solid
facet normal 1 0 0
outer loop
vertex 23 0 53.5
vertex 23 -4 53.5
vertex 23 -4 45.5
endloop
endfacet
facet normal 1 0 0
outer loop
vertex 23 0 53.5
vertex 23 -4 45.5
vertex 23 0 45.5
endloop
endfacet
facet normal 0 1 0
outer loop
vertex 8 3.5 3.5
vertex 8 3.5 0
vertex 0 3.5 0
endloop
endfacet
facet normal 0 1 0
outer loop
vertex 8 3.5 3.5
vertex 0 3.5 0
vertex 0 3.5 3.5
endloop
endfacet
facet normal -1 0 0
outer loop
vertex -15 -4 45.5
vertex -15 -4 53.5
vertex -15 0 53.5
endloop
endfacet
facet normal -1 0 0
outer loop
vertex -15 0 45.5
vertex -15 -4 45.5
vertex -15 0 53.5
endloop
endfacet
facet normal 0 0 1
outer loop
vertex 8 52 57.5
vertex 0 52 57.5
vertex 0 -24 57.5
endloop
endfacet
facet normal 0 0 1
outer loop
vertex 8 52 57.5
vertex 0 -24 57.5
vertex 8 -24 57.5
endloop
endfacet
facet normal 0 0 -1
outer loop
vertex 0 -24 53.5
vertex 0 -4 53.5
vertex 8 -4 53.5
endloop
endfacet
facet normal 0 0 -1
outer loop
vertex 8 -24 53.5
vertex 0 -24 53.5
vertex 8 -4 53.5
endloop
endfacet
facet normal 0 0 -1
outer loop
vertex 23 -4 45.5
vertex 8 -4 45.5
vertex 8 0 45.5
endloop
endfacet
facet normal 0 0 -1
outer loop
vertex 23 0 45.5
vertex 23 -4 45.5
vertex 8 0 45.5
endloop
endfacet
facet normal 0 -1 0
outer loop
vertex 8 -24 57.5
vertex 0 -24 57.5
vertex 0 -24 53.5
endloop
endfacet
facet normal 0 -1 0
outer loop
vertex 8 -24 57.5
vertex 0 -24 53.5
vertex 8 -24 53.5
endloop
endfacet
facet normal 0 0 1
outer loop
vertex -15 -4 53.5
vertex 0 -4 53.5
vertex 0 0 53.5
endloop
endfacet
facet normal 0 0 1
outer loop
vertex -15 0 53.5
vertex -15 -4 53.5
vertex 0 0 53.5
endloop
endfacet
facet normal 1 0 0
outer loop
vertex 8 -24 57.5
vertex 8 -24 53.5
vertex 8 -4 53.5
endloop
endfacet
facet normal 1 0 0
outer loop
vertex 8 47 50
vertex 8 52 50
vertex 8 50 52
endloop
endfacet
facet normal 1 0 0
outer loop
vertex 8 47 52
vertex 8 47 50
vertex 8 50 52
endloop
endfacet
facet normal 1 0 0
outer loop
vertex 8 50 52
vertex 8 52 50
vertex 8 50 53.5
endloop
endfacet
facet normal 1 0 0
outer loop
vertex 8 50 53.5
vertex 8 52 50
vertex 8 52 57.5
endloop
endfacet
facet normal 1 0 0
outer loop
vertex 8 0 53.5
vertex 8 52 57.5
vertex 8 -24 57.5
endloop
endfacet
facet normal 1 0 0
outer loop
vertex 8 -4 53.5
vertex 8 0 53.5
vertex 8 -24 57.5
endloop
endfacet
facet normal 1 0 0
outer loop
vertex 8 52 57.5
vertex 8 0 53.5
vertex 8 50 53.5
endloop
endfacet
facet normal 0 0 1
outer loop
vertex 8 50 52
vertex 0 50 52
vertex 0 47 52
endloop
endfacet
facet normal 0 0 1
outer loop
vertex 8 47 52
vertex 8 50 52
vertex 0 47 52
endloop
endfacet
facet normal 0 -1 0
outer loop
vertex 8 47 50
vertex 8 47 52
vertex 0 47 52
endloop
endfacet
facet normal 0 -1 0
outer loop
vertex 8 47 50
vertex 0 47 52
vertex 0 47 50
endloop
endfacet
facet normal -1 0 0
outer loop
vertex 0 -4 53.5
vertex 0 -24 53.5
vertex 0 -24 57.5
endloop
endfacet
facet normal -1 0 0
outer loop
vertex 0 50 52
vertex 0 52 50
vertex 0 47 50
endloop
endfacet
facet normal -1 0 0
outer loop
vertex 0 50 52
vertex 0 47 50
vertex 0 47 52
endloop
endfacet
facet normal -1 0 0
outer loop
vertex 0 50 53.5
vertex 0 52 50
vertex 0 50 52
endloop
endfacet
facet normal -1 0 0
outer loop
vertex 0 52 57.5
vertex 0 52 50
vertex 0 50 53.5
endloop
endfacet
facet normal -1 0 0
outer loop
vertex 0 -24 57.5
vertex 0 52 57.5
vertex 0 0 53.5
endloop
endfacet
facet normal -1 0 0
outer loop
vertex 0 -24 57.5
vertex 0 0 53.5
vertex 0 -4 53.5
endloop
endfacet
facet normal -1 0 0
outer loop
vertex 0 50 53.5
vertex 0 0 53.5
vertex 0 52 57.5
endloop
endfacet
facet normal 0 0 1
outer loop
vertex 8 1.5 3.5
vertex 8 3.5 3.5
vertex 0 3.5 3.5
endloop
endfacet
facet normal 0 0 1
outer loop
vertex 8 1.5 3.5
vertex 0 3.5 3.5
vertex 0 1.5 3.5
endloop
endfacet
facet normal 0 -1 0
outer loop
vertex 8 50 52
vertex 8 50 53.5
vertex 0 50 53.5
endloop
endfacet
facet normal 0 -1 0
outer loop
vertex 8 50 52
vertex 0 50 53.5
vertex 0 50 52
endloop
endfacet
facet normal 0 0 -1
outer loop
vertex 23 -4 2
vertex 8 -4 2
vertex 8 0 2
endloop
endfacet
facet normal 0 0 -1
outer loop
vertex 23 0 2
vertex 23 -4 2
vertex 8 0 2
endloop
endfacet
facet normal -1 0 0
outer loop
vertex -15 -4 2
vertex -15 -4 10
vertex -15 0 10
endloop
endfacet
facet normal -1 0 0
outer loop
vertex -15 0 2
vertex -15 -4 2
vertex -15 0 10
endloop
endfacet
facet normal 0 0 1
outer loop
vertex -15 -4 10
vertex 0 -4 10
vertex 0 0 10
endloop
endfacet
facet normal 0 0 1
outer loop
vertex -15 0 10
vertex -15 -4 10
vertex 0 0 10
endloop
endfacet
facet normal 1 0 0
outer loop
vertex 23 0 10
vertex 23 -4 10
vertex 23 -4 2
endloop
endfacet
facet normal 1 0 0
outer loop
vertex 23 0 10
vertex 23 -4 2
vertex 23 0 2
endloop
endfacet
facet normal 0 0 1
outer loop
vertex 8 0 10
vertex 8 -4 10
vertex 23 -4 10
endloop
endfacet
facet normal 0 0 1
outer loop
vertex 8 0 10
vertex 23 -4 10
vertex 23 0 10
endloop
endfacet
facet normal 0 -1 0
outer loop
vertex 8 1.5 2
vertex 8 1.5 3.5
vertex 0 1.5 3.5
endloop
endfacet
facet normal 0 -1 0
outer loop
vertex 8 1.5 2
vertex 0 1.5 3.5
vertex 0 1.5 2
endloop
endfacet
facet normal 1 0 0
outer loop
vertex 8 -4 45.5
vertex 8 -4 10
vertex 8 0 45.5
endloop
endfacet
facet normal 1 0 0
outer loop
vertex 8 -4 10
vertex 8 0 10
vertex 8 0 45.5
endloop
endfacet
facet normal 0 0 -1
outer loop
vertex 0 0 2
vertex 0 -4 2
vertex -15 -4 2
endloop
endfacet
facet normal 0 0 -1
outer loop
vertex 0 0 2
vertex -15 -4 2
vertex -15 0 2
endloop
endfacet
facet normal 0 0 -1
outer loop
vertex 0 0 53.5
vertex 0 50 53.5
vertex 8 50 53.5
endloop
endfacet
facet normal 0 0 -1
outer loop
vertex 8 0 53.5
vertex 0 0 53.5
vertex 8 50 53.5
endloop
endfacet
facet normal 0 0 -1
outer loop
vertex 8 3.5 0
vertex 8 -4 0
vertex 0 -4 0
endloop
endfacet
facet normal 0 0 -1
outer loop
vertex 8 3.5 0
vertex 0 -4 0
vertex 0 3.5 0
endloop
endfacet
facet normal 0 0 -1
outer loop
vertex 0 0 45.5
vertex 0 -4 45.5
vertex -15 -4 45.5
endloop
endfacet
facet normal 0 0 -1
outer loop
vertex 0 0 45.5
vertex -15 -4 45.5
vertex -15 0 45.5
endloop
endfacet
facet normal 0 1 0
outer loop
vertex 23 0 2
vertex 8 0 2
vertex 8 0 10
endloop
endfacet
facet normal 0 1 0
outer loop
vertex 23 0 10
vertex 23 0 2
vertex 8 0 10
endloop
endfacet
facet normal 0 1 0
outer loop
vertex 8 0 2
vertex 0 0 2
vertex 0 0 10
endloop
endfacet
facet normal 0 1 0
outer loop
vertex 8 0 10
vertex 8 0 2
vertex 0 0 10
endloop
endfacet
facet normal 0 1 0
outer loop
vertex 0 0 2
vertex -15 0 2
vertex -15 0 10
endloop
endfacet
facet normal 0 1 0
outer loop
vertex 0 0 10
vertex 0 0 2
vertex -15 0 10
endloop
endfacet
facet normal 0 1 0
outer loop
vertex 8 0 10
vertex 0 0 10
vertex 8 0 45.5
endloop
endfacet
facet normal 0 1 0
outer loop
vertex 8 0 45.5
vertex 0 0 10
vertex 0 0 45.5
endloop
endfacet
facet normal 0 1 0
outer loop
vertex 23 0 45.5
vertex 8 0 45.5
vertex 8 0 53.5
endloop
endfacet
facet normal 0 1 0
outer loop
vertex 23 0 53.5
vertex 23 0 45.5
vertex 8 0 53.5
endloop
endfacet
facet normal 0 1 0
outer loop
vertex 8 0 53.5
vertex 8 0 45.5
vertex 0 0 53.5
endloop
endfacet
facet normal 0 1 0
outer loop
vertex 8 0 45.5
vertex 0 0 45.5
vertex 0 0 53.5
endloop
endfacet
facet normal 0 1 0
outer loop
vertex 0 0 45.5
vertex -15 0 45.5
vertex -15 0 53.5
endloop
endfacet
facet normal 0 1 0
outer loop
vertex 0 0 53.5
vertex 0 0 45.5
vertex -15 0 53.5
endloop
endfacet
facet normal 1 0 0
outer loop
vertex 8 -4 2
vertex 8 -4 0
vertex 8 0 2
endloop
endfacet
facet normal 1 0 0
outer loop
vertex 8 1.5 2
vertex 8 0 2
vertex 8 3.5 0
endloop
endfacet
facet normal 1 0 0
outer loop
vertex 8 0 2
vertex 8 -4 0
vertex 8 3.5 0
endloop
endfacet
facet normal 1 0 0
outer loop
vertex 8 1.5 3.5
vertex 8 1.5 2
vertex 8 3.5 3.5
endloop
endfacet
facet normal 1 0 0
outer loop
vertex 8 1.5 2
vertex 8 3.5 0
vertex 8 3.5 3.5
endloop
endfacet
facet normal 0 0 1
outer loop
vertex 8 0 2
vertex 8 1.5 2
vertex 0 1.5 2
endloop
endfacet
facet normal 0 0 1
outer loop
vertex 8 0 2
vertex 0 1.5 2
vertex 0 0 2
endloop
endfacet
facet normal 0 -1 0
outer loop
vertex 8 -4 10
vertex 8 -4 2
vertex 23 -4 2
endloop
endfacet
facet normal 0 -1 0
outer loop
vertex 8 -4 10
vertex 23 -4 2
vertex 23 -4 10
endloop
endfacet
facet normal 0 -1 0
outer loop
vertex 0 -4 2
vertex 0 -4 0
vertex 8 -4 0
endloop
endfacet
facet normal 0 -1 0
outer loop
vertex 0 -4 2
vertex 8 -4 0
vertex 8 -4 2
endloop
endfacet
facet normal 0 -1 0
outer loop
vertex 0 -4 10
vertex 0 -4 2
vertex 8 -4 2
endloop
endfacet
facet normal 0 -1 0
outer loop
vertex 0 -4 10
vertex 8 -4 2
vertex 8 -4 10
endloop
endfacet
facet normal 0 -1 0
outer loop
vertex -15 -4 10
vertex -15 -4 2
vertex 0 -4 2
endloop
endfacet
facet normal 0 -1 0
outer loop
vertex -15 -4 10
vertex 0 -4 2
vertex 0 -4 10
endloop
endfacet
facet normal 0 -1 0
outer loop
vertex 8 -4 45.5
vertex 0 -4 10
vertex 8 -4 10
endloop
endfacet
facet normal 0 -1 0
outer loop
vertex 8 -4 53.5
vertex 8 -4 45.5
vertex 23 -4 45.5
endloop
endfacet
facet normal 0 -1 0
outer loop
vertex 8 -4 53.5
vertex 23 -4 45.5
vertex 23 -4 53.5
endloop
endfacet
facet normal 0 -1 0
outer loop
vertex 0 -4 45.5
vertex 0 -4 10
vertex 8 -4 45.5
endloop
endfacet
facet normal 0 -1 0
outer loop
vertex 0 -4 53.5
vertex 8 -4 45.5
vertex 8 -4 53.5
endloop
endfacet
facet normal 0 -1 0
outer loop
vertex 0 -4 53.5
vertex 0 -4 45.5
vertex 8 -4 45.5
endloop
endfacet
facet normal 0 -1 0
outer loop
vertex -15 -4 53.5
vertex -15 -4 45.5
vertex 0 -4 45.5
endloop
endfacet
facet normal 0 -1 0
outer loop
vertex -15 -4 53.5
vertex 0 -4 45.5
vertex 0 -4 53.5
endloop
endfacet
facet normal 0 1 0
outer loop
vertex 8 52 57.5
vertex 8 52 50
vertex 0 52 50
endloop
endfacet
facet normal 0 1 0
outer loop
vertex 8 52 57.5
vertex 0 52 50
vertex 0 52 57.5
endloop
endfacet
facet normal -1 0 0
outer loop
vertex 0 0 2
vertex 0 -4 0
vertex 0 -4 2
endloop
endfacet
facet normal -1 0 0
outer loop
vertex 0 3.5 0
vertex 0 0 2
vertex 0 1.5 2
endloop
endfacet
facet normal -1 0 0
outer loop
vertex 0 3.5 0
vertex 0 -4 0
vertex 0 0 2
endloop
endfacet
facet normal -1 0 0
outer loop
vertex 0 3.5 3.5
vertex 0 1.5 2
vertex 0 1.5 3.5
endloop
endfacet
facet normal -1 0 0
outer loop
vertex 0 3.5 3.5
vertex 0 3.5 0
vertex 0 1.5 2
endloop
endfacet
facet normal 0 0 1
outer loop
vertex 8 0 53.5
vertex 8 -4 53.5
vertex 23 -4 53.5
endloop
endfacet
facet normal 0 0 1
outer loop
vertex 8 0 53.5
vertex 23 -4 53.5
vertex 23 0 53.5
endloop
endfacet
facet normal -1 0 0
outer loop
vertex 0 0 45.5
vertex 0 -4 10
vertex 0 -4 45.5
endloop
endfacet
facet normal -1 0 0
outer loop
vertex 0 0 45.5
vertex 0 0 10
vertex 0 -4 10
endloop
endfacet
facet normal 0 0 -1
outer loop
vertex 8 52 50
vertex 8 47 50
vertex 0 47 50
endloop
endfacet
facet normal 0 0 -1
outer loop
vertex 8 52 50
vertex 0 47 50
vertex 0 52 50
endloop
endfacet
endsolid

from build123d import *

# Parameters (mm, degrees)
F0_W           = 8
F0_H           = 53.5
F1_DEPTH       = 4
F2_W           = 8
F2_H           = 52
F2_H_2         = 4
F3_DEPTH       = 4
F5_DEPTH       = 8
F7_DEPTH       = 8
F9_W           = 8
F9_H           = 4
F10_DEPTH      = 20
F11_W          = 4
F11_H          = 8
F12_DEPTH      = 15
F12_DEPTH_BACK = 23


with BuildPart() as f1:
    # F0 (on Front) → F1 (new body)
    with BuildSketch(Plane.XZ):
        with Locations((4, 26.75)):
            Rectangle(F0_W, F0_H)
    extrude(amount=F1_DEPTH)

    # F2 (on face) → F3 (join)
    with BuildSketch(Plane.XY.offset(53.5)):
        with Locations((4, 26)):
            Rectangle(F2_W, F2_H)
        with Locations((4, -2)):
            Rectangle(F2_W, F2_H_2)
    extrude(amount=F3_DEPTH)

    # F4 (on face) → F5 (join)
    with BuildSketch(Plane.YZ.offset(8)):
        Polygon((52, 50), (52, 53.5), (50, 53.5), (50, 52), (47, 52), (47, 50), (50, 50), align=None)
    extrude(amount=-F5_DEPTH)


with BuildPart() as f7:
    # F6 (on face) → F7 (new body)
    with BuildSketch(Plane.YZ.offset(8)):
        Polygon((0, 2), (0, 0), (3.5, 0), (3.5, 2), (3.5, 3.5), (1.5, 3.5), (1.5, 2), align=None)
    extrude(amount=-F7_DEPTH)


with BuildPart() as f1_1:
    add(f1.part)

    # F8: union F7
    add(f7.part)

    # F9 (on face) → F10 (join)
    with BuildSketch(Plane.XZ.offset(4)):
        with Locations((4, 55.5)):
            Rectangle(F9_W, F9_H)
    extrude(amount=F10_DEPTH)

    # F11 (on face) → F12 (join, two sides)
    with BuildSketch(Plane.YZ.offset(8)) as f12_sk:
        with Locations((-2, 49.5)):
            Rectangle(F11_W, F11_H)
        with Locations((-2, 6)):
            Rectangle(F11_W, F11_H)
    extrude(amount=F12_DEPTH)
    extrude(f12_sk.sketch, amount=-F12_DEPTH_BACK)


solid = f1_1.part
